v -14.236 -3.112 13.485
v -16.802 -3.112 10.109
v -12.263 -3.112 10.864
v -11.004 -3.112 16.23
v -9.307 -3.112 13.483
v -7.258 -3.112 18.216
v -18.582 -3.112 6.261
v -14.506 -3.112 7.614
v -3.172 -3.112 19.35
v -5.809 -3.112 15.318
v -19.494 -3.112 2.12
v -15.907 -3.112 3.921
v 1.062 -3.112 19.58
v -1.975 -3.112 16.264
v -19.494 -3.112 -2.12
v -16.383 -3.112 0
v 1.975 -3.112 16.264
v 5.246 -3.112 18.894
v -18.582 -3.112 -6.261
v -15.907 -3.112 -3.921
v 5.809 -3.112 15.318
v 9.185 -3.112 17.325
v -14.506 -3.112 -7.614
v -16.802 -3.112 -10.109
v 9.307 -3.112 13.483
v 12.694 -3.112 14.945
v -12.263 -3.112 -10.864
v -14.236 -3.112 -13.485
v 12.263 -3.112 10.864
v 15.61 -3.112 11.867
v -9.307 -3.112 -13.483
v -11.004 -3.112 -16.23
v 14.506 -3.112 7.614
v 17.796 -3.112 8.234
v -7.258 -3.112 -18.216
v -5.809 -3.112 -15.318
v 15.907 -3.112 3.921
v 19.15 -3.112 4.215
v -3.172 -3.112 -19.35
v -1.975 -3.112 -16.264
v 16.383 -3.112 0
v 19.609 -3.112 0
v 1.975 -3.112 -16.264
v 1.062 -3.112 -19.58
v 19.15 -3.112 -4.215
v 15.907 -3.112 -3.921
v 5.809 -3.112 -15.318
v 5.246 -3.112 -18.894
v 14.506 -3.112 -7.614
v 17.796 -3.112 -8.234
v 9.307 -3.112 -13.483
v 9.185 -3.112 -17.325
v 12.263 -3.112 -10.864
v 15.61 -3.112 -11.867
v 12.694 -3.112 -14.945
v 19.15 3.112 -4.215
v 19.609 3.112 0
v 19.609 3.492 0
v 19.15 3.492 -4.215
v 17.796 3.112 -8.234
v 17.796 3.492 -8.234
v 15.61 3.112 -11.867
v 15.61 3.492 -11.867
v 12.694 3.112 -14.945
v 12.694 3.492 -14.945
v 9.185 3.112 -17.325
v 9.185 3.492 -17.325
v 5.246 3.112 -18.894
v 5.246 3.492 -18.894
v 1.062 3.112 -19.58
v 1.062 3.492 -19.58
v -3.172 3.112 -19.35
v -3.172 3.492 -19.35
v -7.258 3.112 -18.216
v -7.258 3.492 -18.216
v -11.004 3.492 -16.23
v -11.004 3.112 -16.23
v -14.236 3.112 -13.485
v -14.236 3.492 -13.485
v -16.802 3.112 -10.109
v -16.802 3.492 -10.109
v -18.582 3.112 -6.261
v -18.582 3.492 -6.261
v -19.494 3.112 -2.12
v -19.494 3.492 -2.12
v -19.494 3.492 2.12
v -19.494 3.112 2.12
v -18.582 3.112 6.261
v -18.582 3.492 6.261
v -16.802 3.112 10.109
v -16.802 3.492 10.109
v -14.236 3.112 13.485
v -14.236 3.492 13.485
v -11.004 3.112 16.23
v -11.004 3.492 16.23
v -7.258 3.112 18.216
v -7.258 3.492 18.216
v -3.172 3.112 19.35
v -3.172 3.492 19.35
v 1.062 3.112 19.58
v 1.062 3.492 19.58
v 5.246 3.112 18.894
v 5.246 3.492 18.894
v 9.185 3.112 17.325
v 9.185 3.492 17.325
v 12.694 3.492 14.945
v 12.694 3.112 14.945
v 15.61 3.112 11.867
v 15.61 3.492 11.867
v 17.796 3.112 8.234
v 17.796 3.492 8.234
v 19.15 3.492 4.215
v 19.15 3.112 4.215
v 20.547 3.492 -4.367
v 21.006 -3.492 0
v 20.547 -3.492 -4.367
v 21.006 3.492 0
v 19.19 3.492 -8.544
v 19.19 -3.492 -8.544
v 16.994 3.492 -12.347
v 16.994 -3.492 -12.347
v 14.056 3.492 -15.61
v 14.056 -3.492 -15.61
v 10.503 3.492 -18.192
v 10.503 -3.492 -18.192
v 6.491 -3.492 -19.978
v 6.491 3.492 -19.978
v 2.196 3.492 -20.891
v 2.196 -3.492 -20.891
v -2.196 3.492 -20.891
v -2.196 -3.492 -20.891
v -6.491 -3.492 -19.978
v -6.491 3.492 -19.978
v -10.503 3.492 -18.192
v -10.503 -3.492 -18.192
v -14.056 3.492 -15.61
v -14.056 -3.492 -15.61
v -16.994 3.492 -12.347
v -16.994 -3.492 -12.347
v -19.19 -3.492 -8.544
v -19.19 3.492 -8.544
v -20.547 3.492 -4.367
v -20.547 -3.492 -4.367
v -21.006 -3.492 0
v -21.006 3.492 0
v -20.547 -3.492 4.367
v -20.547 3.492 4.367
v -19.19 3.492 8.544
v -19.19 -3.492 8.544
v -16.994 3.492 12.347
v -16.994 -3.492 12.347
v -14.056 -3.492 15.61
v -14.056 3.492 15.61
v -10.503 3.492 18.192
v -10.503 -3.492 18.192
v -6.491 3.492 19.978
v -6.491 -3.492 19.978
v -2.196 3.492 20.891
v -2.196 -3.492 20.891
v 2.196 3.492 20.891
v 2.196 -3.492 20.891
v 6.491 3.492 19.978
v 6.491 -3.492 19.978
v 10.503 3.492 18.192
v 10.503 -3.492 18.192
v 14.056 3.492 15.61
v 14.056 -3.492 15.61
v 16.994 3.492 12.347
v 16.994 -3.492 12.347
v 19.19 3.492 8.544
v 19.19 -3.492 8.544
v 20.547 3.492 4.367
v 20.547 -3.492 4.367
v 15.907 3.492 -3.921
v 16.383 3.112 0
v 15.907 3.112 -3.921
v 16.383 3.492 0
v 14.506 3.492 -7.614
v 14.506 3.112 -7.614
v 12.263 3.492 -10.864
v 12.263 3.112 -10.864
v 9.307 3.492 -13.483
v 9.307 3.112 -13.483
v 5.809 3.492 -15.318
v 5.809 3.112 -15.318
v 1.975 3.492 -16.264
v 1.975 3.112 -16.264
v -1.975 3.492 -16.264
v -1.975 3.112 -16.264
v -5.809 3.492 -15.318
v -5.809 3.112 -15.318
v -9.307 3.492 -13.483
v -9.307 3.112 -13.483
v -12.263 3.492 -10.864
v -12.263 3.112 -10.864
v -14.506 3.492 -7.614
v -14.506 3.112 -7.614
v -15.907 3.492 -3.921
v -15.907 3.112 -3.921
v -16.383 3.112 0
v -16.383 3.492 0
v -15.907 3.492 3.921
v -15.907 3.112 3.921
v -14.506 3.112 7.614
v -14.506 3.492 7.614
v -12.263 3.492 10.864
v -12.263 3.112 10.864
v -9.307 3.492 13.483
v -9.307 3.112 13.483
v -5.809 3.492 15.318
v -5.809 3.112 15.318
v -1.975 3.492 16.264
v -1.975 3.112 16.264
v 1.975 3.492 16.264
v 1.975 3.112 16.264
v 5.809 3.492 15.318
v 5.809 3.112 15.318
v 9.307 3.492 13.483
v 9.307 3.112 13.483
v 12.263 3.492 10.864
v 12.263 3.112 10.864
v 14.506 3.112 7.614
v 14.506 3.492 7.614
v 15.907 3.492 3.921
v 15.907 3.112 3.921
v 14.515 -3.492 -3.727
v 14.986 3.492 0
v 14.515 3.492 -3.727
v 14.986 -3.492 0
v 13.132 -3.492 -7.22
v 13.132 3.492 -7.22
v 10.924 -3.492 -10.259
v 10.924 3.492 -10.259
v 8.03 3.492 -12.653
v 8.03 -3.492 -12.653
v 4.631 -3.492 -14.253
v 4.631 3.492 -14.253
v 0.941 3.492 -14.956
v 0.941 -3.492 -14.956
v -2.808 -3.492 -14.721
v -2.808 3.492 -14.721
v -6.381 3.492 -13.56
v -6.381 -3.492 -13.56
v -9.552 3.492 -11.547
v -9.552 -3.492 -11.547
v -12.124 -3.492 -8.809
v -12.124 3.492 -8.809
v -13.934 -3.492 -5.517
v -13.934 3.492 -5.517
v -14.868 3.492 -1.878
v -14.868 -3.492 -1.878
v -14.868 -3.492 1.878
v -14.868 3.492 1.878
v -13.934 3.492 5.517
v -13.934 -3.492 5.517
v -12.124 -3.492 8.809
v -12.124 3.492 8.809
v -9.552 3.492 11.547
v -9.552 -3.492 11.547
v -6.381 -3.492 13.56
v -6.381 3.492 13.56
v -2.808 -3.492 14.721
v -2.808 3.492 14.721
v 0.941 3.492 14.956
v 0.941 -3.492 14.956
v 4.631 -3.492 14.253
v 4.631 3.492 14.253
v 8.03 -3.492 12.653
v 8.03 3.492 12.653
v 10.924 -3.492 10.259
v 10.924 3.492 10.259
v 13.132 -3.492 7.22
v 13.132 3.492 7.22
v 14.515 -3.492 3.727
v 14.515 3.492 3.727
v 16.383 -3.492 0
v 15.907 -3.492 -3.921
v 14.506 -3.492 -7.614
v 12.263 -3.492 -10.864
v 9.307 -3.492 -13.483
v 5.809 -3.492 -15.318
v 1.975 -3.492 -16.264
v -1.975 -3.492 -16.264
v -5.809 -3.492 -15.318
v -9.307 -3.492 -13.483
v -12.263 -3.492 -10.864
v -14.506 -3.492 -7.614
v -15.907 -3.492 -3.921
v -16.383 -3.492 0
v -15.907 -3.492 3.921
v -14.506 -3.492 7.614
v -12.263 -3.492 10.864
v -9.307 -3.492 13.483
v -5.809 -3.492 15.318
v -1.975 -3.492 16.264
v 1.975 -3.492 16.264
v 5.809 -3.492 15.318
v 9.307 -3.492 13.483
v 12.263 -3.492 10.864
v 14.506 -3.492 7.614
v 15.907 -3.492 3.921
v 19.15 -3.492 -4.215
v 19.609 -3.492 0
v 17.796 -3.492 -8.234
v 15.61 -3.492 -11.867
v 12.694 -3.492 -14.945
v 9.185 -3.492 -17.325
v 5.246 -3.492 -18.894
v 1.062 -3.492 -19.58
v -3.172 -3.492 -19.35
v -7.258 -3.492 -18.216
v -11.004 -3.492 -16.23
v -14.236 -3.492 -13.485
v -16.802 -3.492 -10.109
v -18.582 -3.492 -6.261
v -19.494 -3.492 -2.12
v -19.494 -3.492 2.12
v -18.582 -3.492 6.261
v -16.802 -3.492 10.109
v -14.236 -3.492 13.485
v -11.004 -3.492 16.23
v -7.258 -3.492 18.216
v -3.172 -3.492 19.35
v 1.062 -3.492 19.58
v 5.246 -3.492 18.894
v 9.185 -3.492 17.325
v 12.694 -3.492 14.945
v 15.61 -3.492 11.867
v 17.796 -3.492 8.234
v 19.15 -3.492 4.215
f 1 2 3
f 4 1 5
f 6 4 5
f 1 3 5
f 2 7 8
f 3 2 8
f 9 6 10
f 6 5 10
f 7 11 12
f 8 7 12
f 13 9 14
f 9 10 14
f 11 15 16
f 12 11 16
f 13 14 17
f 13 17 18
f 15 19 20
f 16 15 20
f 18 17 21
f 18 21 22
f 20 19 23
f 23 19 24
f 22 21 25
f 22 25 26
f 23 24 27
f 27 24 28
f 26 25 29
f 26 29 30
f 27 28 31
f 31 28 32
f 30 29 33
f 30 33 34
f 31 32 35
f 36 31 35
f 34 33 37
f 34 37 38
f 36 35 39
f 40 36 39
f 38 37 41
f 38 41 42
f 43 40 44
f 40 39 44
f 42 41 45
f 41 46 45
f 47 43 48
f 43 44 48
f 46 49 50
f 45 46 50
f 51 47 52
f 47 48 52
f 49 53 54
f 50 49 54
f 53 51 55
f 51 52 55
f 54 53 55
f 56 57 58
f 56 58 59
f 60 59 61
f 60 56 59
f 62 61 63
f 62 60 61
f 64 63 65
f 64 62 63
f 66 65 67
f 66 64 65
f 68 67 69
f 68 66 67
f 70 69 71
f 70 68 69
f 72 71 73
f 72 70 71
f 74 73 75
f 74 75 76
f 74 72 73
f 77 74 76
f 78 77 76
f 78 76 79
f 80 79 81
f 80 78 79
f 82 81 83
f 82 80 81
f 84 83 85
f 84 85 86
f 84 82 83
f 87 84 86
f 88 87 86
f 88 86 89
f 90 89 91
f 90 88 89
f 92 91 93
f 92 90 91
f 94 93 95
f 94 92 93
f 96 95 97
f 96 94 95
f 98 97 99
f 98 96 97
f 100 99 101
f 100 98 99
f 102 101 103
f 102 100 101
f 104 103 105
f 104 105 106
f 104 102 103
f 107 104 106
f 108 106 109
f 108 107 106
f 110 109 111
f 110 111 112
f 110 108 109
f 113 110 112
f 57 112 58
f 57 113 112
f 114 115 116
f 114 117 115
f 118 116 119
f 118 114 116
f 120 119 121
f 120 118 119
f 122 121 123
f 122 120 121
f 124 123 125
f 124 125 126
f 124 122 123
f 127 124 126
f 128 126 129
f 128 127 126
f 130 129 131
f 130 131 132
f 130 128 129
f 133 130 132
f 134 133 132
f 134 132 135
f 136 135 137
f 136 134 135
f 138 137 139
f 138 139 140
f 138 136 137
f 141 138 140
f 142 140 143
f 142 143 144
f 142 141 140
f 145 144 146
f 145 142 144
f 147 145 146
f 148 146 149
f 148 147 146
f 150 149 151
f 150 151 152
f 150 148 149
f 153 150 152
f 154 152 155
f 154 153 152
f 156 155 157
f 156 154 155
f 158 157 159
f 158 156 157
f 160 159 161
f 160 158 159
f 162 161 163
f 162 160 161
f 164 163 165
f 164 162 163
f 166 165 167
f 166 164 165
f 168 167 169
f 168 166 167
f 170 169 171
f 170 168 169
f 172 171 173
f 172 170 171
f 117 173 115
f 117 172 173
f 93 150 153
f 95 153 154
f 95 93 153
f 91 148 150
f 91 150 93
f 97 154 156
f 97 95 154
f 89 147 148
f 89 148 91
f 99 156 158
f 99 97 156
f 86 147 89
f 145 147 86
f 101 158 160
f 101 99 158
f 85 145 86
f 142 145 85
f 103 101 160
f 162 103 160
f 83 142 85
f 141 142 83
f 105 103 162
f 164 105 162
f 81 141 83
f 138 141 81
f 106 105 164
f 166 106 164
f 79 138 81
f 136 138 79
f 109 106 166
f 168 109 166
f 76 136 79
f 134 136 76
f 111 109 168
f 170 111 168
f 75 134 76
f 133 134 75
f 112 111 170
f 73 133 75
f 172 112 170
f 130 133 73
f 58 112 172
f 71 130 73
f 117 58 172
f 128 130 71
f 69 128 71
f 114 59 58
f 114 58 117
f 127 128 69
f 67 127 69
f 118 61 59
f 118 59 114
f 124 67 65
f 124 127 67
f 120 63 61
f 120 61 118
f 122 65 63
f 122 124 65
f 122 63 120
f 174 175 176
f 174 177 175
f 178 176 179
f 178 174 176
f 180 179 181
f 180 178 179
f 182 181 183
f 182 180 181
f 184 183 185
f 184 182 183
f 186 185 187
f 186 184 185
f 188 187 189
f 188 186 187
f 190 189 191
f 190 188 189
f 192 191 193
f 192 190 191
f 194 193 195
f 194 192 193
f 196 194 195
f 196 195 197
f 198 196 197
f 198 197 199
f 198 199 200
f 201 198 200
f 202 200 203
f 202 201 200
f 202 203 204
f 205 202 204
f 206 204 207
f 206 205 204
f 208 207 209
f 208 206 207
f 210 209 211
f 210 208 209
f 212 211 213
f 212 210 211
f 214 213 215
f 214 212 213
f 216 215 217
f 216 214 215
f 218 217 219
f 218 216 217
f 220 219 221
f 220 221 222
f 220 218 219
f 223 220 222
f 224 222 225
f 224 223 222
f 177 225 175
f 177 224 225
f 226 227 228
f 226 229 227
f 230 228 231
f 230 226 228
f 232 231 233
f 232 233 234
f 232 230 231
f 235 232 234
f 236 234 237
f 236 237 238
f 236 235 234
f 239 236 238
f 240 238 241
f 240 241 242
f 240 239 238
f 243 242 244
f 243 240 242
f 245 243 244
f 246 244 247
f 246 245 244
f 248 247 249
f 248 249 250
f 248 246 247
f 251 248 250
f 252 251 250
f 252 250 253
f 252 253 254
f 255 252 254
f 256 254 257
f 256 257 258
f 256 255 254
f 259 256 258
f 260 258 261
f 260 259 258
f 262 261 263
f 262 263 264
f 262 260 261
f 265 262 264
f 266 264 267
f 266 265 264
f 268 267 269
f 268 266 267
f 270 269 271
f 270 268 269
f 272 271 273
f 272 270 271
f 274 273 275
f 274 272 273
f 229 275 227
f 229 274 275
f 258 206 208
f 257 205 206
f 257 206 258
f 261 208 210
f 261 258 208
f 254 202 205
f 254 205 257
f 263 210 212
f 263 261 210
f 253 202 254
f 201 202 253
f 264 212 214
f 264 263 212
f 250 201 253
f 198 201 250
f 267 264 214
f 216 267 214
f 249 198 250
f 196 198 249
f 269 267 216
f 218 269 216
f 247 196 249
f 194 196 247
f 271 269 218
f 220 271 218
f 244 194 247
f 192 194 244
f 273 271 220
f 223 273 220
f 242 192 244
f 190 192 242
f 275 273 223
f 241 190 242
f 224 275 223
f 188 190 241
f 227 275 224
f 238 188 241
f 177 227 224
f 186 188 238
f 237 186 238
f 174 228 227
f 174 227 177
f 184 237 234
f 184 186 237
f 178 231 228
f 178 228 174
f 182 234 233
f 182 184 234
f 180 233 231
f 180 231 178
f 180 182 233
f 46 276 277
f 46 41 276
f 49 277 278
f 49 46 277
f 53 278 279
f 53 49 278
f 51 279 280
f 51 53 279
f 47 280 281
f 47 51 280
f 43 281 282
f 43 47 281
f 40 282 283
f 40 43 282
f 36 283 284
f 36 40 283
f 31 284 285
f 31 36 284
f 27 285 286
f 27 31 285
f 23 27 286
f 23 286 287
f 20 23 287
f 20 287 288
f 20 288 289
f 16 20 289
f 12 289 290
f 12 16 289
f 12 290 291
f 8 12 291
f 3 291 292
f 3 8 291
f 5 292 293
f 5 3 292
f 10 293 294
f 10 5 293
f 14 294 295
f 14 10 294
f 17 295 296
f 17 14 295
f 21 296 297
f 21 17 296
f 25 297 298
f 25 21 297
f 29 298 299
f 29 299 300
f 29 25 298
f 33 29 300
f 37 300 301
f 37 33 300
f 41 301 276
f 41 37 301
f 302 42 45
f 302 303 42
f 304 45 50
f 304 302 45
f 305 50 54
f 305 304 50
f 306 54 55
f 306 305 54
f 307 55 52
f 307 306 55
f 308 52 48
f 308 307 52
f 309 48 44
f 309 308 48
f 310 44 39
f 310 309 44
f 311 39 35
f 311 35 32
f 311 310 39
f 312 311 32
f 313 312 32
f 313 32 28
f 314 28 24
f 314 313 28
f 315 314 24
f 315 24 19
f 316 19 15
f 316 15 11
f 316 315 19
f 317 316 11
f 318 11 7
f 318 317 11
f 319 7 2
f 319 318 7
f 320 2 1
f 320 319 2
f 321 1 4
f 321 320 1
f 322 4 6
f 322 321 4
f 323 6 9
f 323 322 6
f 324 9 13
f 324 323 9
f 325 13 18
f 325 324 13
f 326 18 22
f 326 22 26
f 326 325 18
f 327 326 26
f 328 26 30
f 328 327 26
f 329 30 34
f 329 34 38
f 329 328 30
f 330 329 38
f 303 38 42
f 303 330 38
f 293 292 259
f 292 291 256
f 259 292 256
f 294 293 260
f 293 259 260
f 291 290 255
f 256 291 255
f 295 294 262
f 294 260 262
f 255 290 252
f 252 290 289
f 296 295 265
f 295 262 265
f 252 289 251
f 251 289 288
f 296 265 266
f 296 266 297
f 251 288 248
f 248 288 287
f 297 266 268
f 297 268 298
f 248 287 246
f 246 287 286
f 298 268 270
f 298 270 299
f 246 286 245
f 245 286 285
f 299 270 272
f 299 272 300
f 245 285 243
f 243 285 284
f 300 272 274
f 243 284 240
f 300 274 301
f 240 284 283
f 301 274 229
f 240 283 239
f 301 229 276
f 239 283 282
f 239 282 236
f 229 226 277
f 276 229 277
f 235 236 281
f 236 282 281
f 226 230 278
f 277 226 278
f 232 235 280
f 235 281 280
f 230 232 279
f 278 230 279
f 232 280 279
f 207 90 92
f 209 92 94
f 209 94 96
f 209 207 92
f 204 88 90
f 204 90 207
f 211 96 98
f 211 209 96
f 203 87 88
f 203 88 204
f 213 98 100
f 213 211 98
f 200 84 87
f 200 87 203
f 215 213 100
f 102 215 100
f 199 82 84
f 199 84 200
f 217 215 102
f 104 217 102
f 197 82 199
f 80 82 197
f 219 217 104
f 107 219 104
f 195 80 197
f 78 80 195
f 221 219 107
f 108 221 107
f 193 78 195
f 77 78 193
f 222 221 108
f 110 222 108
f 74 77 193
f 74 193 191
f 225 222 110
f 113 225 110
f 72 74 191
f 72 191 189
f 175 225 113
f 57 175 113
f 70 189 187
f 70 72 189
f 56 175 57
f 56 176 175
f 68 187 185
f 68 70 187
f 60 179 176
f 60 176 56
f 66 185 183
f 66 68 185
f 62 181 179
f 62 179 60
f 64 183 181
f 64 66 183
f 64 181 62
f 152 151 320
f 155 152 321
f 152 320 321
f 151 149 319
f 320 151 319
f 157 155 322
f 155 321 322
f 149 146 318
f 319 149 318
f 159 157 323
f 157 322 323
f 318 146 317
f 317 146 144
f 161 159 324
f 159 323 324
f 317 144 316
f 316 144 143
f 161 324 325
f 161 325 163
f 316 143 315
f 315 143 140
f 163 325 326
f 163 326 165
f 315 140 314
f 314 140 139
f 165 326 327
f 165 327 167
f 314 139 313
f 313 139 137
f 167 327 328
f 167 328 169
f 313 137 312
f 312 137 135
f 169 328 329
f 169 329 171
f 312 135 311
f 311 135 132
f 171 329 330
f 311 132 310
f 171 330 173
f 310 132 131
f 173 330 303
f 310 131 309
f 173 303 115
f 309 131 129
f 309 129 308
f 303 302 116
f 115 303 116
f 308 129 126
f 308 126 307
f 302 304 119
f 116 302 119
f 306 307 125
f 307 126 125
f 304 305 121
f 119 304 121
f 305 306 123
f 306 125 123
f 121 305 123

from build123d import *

# Parameters (mm, degrees)
BOSS_EXTRUDE1_DEPTH        = 3.4925
BOSS_EXTRUDE1_DEPTH_BACK   = 3.4925
SKETCH1_R                  = 21.0058
SKETCH1_R_2                = 19.6088
BOSS_EXTRUDE1_2_DEPTH      = 3.4925
BOSS_EXTRUDE1_2_DEPTH_BACK = 3.4925
SKETCH1_R_3                = 16.383
SKETCH1_R_4                = 14.986
BOSS_EXTRUDE2_DEPTH        = 3.1115
BOSS_EXTRUDE2_DEPTH_BACK   = 3.1115
SKETCH1_3_R                = 19.6088
SKETCH1_3_R_2              = 16.383


with BuildPart() as part:
    # Sketch1 → Boss-Extrude1 (new, two sides: drawn at the far end of the back side and taken through both)
    with BuildSketch(Plane(origin=(0, 0, 0), x_dir=(1, 0, 0), z_dir=(0, 1, 0)).offset(-BOSS_EXTRUDE1_DEPTH_BACK)):
        Circle(SKETCH1_R)
        Circle(SKETCH1_R_2, mode=Mode.SUBTRACT)
    extrude(amount=BOSS_EXTRUDE1_DEPTH + BOSS_EXTRUDE1_DEPTH_BACK)



with BuildPart() as body_2:
    # Sketch1 → Boss-Extrude1 2 (new, two sides: drawn at the far end of the back side and taken through both)
    with BuildSketch(Plane(origin=(0, 0, 0), x_dir=(1, 0, 0), z_dir=(0, 1, 0)).offset(-BOSS_EXTRUDE1_2_DEPTH_BACK)):
        Circle(SKETCH1_R_3)
        Circle(SKETCH1_R_4, mode=Mode.SUBTRACT)
    extrude(amount=BOSS_EXTRUDE1_2_DEPTH + BOSS_EXTRUDE1_2_DEPTH_BACK)


with BuildPart() as part_1:
    add(part.part)

    add(body_2.part)  # Boss-Extrude2 merges body 2
    # Sketch1<3> → Boss-Extrude2 (add, two sides: drawn at the far end of the back side and taken through both)
    with BuildSketch(Plane(origin=(0, 0, 0), x_dir=(1, 0, 0), z_dir=(0, 1, 0)).offset(-BOSS_EXTRUDE2_DEPTH_BACK)):
        Circle(SKETCH1_3_R)
        Circle(SKETCH1_3_R_2, mode=Mode.SUBTRACT)
    extrude(amount=BOSS_EXTRUDE2_DEPTH + BOSS_EXTRUDE2_DEPTH_BACK)


solid = part_1.part
